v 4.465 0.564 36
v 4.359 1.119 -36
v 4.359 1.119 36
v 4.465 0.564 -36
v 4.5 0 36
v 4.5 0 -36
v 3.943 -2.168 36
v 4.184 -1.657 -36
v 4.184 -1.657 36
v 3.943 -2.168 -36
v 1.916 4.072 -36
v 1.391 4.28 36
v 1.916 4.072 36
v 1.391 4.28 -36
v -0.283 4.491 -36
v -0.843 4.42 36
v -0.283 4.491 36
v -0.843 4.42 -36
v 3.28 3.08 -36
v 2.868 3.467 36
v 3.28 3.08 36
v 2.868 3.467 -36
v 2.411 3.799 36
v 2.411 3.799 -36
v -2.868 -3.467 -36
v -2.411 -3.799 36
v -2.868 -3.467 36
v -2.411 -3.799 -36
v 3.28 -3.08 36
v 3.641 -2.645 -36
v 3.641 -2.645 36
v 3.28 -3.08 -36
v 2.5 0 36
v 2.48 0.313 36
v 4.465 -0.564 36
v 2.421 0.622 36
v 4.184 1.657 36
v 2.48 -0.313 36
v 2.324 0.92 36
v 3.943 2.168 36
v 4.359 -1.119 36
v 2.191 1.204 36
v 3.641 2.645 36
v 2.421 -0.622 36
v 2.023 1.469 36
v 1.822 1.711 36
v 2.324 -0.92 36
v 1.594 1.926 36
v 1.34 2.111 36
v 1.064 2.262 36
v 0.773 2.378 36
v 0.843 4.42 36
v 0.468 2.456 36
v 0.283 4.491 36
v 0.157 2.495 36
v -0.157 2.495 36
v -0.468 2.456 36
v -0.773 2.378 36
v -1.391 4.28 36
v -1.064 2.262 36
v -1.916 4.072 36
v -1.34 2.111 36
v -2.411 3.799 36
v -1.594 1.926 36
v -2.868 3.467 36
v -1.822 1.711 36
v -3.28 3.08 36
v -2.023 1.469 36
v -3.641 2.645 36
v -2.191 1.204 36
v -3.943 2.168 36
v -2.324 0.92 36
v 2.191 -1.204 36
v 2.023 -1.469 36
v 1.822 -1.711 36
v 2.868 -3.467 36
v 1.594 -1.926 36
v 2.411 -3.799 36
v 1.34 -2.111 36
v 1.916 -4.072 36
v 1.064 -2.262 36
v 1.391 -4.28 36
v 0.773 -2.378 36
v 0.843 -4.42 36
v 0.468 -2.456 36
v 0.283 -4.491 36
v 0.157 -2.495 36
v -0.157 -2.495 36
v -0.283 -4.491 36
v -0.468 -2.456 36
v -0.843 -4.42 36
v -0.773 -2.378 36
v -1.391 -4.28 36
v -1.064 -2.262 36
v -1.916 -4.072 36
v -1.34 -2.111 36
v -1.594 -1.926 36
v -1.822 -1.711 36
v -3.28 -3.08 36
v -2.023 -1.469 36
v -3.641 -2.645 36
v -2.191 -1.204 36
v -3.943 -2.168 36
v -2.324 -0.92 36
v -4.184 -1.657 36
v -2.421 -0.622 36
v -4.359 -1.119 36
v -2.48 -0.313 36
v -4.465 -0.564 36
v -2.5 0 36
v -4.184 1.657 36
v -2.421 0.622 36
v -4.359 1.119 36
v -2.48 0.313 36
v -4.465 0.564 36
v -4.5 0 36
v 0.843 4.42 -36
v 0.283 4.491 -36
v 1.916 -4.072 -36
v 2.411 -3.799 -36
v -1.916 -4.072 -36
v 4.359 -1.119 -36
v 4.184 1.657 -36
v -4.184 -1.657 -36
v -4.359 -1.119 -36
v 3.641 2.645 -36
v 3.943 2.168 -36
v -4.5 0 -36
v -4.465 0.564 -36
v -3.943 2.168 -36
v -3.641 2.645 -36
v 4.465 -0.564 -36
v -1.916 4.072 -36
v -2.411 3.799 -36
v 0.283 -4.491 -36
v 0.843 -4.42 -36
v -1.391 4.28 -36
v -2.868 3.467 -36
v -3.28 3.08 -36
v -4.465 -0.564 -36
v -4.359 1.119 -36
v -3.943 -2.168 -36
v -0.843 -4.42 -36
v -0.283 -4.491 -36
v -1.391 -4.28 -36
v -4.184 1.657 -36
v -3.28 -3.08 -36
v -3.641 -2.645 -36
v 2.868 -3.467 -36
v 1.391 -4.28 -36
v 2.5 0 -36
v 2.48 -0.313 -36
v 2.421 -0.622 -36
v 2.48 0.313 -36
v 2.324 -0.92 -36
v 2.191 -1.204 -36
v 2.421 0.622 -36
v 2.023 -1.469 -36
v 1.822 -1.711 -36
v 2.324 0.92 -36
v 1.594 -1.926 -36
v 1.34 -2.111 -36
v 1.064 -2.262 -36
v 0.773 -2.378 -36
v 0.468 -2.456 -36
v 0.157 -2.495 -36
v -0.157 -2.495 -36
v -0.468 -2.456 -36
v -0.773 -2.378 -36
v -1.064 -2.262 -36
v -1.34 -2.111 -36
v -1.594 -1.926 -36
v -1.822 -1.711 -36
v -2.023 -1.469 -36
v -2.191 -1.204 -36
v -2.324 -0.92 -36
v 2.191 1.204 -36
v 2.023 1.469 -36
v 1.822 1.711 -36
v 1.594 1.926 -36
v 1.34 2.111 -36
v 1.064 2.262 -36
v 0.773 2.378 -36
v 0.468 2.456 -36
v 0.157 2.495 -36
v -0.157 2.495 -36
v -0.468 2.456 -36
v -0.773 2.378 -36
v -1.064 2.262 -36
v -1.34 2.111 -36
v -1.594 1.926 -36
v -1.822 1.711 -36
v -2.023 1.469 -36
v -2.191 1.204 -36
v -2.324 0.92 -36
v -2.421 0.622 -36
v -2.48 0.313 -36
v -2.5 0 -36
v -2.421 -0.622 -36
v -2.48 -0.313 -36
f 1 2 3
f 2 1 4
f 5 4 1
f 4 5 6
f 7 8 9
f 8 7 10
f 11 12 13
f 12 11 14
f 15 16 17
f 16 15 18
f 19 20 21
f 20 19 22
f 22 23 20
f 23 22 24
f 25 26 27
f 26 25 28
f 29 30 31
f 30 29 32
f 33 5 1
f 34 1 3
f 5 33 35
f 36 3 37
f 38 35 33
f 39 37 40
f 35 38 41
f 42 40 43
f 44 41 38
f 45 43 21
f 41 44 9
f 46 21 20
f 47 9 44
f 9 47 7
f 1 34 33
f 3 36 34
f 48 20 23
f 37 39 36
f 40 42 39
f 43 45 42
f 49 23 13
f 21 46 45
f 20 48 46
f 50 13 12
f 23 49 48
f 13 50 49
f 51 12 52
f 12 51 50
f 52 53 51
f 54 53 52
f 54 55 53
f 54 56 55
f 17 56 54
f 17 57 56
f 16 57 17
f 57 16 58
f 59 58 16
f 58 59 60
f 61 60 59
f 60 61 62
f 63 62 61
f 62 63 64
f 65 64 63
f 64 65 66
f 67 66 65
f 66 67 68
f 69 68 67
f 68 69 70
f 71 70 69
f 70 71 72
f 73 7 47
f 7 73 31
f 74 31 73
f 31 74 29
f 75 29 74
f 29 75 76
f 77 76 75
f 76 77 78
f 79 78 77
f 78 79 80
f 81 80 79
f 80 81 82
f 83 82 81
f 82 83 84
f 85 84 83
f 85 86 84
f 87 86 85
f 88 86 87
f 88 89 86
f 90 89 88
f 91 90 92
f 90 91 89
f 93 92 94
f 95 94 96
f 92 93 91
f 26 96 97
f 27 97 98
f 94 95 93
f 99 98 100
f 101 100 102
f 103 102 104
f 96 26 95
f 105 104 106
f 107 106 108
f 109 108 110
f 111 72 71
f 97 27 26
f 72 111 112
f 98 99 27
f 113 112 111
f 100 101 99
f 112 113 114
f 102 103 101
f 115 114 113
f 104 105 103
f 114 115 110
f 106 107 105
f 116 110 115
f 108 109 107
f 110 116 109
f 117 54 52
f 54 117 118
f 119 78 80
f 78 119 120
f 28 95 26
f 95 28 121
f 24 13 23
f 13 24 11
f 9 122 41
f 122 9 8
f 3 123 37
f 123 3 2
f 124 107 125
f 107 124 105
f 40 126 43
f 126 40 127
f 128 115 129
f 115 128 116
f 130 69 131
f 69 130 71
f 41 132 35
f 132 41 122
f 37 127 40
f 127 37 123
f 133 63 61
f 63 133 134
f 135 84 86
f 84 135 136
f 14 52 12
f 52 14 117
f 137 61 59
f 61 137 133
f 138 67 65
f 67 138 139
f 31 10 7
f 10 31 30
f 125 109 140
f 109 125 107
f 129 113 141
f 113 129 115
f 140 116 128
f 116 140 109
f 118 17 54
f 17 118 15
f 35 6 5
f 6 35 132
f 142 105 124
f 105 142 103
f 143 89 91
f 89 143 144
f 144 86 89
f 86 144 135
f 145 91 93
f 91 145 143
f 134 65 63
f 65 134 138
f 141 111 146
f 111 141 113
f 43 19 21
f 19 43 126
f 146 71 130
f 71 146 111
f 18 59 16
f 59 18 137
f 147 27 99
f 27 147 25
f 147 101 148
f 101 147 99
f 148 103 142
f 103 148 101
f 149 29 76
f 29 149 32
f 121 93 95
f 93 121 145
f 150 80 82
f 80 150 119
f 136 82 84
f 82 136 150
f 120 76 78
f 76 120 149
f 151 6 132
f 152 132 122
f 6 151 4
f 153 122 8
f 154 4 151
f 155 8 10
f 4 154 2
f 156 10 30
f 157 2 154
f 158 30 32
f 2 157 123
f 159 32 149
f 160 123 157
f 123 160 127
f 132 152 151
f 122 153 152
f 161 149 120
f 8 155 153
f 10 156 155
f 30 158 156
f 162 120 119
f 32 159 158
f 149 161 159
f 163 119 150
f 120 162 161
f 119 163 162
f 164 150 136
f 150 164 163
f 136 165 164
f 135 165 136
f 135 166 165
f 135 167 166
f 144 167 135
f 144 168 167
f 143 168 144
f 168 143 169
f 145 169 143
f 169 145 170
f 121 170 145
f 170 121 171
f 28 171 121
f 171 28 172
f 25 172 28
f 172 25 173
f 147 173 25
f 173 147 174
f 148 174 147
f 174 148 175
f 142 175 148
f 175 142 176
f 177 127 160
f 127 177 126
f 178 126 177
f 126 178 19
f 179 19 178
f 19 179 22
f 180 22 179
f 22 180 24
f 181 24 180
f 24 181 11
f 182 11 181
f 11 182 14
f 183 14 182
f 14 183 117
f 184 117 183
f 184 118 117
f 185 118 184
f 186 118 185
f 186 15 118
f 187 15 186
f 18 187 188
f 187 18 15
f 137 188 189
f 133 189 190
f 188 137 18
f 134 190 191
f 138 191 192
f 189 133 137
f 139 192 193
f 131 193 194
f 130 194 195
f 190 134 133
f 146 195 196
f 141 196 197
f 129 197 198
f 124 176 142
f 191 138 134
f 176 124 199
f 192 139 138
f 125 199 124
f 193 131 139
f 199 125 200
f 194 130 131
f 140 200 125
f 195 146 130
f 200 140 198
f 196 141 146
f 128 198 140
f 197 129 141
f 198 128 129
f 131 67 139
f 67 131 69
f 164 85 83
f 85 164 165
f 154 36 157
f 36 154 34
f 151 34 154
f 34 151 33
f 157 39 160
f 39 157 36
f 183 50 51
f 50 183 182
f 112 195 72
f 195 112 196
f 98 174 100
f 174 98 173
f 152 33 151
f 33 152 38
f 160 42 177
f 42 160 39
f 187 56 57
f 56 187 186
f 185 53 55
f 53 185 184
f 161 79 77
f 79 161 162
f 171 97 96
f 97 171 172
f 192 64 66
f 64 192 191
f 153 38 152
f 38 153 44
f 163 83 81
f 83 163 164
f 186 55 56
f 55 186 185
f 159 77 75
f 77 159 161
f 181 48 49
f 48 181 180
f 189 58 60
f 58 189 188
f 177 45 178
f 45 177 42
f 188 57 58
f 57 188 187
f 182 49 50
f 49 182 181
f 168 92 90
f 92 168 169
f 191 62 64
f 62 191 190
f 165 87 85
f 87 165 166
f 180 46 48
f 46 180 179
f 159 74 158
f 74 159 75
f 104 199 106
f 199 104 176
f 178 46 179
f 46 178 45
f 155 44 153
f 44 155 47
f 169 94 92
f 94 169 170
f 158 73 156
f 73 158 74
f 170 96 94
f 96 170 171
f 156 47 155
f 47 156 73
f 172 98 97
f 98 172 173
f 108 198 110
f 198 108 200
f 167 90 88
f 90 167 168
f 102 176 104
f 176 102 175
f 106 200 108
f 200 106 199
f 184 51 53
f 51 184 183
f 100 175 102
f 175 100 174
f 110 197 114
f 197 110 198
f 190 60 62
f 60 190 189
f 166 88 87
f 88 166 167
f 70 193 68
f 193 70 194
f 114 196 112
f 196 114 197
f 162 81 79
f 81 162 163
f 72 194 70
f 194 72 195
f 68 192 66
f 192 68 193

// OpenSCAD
$fn = 50;


difference() {
	union() {
		translate(v = [0, 0, -36.0000000000]) {
			cylinder(h = 72, r = 4.5000000000);
		}
	}
	union() {
		translate(v = [0, 0, -100.0000000000]) {
			cylinder(h = 200, r = 2.5000000000);
		}
	}
}
